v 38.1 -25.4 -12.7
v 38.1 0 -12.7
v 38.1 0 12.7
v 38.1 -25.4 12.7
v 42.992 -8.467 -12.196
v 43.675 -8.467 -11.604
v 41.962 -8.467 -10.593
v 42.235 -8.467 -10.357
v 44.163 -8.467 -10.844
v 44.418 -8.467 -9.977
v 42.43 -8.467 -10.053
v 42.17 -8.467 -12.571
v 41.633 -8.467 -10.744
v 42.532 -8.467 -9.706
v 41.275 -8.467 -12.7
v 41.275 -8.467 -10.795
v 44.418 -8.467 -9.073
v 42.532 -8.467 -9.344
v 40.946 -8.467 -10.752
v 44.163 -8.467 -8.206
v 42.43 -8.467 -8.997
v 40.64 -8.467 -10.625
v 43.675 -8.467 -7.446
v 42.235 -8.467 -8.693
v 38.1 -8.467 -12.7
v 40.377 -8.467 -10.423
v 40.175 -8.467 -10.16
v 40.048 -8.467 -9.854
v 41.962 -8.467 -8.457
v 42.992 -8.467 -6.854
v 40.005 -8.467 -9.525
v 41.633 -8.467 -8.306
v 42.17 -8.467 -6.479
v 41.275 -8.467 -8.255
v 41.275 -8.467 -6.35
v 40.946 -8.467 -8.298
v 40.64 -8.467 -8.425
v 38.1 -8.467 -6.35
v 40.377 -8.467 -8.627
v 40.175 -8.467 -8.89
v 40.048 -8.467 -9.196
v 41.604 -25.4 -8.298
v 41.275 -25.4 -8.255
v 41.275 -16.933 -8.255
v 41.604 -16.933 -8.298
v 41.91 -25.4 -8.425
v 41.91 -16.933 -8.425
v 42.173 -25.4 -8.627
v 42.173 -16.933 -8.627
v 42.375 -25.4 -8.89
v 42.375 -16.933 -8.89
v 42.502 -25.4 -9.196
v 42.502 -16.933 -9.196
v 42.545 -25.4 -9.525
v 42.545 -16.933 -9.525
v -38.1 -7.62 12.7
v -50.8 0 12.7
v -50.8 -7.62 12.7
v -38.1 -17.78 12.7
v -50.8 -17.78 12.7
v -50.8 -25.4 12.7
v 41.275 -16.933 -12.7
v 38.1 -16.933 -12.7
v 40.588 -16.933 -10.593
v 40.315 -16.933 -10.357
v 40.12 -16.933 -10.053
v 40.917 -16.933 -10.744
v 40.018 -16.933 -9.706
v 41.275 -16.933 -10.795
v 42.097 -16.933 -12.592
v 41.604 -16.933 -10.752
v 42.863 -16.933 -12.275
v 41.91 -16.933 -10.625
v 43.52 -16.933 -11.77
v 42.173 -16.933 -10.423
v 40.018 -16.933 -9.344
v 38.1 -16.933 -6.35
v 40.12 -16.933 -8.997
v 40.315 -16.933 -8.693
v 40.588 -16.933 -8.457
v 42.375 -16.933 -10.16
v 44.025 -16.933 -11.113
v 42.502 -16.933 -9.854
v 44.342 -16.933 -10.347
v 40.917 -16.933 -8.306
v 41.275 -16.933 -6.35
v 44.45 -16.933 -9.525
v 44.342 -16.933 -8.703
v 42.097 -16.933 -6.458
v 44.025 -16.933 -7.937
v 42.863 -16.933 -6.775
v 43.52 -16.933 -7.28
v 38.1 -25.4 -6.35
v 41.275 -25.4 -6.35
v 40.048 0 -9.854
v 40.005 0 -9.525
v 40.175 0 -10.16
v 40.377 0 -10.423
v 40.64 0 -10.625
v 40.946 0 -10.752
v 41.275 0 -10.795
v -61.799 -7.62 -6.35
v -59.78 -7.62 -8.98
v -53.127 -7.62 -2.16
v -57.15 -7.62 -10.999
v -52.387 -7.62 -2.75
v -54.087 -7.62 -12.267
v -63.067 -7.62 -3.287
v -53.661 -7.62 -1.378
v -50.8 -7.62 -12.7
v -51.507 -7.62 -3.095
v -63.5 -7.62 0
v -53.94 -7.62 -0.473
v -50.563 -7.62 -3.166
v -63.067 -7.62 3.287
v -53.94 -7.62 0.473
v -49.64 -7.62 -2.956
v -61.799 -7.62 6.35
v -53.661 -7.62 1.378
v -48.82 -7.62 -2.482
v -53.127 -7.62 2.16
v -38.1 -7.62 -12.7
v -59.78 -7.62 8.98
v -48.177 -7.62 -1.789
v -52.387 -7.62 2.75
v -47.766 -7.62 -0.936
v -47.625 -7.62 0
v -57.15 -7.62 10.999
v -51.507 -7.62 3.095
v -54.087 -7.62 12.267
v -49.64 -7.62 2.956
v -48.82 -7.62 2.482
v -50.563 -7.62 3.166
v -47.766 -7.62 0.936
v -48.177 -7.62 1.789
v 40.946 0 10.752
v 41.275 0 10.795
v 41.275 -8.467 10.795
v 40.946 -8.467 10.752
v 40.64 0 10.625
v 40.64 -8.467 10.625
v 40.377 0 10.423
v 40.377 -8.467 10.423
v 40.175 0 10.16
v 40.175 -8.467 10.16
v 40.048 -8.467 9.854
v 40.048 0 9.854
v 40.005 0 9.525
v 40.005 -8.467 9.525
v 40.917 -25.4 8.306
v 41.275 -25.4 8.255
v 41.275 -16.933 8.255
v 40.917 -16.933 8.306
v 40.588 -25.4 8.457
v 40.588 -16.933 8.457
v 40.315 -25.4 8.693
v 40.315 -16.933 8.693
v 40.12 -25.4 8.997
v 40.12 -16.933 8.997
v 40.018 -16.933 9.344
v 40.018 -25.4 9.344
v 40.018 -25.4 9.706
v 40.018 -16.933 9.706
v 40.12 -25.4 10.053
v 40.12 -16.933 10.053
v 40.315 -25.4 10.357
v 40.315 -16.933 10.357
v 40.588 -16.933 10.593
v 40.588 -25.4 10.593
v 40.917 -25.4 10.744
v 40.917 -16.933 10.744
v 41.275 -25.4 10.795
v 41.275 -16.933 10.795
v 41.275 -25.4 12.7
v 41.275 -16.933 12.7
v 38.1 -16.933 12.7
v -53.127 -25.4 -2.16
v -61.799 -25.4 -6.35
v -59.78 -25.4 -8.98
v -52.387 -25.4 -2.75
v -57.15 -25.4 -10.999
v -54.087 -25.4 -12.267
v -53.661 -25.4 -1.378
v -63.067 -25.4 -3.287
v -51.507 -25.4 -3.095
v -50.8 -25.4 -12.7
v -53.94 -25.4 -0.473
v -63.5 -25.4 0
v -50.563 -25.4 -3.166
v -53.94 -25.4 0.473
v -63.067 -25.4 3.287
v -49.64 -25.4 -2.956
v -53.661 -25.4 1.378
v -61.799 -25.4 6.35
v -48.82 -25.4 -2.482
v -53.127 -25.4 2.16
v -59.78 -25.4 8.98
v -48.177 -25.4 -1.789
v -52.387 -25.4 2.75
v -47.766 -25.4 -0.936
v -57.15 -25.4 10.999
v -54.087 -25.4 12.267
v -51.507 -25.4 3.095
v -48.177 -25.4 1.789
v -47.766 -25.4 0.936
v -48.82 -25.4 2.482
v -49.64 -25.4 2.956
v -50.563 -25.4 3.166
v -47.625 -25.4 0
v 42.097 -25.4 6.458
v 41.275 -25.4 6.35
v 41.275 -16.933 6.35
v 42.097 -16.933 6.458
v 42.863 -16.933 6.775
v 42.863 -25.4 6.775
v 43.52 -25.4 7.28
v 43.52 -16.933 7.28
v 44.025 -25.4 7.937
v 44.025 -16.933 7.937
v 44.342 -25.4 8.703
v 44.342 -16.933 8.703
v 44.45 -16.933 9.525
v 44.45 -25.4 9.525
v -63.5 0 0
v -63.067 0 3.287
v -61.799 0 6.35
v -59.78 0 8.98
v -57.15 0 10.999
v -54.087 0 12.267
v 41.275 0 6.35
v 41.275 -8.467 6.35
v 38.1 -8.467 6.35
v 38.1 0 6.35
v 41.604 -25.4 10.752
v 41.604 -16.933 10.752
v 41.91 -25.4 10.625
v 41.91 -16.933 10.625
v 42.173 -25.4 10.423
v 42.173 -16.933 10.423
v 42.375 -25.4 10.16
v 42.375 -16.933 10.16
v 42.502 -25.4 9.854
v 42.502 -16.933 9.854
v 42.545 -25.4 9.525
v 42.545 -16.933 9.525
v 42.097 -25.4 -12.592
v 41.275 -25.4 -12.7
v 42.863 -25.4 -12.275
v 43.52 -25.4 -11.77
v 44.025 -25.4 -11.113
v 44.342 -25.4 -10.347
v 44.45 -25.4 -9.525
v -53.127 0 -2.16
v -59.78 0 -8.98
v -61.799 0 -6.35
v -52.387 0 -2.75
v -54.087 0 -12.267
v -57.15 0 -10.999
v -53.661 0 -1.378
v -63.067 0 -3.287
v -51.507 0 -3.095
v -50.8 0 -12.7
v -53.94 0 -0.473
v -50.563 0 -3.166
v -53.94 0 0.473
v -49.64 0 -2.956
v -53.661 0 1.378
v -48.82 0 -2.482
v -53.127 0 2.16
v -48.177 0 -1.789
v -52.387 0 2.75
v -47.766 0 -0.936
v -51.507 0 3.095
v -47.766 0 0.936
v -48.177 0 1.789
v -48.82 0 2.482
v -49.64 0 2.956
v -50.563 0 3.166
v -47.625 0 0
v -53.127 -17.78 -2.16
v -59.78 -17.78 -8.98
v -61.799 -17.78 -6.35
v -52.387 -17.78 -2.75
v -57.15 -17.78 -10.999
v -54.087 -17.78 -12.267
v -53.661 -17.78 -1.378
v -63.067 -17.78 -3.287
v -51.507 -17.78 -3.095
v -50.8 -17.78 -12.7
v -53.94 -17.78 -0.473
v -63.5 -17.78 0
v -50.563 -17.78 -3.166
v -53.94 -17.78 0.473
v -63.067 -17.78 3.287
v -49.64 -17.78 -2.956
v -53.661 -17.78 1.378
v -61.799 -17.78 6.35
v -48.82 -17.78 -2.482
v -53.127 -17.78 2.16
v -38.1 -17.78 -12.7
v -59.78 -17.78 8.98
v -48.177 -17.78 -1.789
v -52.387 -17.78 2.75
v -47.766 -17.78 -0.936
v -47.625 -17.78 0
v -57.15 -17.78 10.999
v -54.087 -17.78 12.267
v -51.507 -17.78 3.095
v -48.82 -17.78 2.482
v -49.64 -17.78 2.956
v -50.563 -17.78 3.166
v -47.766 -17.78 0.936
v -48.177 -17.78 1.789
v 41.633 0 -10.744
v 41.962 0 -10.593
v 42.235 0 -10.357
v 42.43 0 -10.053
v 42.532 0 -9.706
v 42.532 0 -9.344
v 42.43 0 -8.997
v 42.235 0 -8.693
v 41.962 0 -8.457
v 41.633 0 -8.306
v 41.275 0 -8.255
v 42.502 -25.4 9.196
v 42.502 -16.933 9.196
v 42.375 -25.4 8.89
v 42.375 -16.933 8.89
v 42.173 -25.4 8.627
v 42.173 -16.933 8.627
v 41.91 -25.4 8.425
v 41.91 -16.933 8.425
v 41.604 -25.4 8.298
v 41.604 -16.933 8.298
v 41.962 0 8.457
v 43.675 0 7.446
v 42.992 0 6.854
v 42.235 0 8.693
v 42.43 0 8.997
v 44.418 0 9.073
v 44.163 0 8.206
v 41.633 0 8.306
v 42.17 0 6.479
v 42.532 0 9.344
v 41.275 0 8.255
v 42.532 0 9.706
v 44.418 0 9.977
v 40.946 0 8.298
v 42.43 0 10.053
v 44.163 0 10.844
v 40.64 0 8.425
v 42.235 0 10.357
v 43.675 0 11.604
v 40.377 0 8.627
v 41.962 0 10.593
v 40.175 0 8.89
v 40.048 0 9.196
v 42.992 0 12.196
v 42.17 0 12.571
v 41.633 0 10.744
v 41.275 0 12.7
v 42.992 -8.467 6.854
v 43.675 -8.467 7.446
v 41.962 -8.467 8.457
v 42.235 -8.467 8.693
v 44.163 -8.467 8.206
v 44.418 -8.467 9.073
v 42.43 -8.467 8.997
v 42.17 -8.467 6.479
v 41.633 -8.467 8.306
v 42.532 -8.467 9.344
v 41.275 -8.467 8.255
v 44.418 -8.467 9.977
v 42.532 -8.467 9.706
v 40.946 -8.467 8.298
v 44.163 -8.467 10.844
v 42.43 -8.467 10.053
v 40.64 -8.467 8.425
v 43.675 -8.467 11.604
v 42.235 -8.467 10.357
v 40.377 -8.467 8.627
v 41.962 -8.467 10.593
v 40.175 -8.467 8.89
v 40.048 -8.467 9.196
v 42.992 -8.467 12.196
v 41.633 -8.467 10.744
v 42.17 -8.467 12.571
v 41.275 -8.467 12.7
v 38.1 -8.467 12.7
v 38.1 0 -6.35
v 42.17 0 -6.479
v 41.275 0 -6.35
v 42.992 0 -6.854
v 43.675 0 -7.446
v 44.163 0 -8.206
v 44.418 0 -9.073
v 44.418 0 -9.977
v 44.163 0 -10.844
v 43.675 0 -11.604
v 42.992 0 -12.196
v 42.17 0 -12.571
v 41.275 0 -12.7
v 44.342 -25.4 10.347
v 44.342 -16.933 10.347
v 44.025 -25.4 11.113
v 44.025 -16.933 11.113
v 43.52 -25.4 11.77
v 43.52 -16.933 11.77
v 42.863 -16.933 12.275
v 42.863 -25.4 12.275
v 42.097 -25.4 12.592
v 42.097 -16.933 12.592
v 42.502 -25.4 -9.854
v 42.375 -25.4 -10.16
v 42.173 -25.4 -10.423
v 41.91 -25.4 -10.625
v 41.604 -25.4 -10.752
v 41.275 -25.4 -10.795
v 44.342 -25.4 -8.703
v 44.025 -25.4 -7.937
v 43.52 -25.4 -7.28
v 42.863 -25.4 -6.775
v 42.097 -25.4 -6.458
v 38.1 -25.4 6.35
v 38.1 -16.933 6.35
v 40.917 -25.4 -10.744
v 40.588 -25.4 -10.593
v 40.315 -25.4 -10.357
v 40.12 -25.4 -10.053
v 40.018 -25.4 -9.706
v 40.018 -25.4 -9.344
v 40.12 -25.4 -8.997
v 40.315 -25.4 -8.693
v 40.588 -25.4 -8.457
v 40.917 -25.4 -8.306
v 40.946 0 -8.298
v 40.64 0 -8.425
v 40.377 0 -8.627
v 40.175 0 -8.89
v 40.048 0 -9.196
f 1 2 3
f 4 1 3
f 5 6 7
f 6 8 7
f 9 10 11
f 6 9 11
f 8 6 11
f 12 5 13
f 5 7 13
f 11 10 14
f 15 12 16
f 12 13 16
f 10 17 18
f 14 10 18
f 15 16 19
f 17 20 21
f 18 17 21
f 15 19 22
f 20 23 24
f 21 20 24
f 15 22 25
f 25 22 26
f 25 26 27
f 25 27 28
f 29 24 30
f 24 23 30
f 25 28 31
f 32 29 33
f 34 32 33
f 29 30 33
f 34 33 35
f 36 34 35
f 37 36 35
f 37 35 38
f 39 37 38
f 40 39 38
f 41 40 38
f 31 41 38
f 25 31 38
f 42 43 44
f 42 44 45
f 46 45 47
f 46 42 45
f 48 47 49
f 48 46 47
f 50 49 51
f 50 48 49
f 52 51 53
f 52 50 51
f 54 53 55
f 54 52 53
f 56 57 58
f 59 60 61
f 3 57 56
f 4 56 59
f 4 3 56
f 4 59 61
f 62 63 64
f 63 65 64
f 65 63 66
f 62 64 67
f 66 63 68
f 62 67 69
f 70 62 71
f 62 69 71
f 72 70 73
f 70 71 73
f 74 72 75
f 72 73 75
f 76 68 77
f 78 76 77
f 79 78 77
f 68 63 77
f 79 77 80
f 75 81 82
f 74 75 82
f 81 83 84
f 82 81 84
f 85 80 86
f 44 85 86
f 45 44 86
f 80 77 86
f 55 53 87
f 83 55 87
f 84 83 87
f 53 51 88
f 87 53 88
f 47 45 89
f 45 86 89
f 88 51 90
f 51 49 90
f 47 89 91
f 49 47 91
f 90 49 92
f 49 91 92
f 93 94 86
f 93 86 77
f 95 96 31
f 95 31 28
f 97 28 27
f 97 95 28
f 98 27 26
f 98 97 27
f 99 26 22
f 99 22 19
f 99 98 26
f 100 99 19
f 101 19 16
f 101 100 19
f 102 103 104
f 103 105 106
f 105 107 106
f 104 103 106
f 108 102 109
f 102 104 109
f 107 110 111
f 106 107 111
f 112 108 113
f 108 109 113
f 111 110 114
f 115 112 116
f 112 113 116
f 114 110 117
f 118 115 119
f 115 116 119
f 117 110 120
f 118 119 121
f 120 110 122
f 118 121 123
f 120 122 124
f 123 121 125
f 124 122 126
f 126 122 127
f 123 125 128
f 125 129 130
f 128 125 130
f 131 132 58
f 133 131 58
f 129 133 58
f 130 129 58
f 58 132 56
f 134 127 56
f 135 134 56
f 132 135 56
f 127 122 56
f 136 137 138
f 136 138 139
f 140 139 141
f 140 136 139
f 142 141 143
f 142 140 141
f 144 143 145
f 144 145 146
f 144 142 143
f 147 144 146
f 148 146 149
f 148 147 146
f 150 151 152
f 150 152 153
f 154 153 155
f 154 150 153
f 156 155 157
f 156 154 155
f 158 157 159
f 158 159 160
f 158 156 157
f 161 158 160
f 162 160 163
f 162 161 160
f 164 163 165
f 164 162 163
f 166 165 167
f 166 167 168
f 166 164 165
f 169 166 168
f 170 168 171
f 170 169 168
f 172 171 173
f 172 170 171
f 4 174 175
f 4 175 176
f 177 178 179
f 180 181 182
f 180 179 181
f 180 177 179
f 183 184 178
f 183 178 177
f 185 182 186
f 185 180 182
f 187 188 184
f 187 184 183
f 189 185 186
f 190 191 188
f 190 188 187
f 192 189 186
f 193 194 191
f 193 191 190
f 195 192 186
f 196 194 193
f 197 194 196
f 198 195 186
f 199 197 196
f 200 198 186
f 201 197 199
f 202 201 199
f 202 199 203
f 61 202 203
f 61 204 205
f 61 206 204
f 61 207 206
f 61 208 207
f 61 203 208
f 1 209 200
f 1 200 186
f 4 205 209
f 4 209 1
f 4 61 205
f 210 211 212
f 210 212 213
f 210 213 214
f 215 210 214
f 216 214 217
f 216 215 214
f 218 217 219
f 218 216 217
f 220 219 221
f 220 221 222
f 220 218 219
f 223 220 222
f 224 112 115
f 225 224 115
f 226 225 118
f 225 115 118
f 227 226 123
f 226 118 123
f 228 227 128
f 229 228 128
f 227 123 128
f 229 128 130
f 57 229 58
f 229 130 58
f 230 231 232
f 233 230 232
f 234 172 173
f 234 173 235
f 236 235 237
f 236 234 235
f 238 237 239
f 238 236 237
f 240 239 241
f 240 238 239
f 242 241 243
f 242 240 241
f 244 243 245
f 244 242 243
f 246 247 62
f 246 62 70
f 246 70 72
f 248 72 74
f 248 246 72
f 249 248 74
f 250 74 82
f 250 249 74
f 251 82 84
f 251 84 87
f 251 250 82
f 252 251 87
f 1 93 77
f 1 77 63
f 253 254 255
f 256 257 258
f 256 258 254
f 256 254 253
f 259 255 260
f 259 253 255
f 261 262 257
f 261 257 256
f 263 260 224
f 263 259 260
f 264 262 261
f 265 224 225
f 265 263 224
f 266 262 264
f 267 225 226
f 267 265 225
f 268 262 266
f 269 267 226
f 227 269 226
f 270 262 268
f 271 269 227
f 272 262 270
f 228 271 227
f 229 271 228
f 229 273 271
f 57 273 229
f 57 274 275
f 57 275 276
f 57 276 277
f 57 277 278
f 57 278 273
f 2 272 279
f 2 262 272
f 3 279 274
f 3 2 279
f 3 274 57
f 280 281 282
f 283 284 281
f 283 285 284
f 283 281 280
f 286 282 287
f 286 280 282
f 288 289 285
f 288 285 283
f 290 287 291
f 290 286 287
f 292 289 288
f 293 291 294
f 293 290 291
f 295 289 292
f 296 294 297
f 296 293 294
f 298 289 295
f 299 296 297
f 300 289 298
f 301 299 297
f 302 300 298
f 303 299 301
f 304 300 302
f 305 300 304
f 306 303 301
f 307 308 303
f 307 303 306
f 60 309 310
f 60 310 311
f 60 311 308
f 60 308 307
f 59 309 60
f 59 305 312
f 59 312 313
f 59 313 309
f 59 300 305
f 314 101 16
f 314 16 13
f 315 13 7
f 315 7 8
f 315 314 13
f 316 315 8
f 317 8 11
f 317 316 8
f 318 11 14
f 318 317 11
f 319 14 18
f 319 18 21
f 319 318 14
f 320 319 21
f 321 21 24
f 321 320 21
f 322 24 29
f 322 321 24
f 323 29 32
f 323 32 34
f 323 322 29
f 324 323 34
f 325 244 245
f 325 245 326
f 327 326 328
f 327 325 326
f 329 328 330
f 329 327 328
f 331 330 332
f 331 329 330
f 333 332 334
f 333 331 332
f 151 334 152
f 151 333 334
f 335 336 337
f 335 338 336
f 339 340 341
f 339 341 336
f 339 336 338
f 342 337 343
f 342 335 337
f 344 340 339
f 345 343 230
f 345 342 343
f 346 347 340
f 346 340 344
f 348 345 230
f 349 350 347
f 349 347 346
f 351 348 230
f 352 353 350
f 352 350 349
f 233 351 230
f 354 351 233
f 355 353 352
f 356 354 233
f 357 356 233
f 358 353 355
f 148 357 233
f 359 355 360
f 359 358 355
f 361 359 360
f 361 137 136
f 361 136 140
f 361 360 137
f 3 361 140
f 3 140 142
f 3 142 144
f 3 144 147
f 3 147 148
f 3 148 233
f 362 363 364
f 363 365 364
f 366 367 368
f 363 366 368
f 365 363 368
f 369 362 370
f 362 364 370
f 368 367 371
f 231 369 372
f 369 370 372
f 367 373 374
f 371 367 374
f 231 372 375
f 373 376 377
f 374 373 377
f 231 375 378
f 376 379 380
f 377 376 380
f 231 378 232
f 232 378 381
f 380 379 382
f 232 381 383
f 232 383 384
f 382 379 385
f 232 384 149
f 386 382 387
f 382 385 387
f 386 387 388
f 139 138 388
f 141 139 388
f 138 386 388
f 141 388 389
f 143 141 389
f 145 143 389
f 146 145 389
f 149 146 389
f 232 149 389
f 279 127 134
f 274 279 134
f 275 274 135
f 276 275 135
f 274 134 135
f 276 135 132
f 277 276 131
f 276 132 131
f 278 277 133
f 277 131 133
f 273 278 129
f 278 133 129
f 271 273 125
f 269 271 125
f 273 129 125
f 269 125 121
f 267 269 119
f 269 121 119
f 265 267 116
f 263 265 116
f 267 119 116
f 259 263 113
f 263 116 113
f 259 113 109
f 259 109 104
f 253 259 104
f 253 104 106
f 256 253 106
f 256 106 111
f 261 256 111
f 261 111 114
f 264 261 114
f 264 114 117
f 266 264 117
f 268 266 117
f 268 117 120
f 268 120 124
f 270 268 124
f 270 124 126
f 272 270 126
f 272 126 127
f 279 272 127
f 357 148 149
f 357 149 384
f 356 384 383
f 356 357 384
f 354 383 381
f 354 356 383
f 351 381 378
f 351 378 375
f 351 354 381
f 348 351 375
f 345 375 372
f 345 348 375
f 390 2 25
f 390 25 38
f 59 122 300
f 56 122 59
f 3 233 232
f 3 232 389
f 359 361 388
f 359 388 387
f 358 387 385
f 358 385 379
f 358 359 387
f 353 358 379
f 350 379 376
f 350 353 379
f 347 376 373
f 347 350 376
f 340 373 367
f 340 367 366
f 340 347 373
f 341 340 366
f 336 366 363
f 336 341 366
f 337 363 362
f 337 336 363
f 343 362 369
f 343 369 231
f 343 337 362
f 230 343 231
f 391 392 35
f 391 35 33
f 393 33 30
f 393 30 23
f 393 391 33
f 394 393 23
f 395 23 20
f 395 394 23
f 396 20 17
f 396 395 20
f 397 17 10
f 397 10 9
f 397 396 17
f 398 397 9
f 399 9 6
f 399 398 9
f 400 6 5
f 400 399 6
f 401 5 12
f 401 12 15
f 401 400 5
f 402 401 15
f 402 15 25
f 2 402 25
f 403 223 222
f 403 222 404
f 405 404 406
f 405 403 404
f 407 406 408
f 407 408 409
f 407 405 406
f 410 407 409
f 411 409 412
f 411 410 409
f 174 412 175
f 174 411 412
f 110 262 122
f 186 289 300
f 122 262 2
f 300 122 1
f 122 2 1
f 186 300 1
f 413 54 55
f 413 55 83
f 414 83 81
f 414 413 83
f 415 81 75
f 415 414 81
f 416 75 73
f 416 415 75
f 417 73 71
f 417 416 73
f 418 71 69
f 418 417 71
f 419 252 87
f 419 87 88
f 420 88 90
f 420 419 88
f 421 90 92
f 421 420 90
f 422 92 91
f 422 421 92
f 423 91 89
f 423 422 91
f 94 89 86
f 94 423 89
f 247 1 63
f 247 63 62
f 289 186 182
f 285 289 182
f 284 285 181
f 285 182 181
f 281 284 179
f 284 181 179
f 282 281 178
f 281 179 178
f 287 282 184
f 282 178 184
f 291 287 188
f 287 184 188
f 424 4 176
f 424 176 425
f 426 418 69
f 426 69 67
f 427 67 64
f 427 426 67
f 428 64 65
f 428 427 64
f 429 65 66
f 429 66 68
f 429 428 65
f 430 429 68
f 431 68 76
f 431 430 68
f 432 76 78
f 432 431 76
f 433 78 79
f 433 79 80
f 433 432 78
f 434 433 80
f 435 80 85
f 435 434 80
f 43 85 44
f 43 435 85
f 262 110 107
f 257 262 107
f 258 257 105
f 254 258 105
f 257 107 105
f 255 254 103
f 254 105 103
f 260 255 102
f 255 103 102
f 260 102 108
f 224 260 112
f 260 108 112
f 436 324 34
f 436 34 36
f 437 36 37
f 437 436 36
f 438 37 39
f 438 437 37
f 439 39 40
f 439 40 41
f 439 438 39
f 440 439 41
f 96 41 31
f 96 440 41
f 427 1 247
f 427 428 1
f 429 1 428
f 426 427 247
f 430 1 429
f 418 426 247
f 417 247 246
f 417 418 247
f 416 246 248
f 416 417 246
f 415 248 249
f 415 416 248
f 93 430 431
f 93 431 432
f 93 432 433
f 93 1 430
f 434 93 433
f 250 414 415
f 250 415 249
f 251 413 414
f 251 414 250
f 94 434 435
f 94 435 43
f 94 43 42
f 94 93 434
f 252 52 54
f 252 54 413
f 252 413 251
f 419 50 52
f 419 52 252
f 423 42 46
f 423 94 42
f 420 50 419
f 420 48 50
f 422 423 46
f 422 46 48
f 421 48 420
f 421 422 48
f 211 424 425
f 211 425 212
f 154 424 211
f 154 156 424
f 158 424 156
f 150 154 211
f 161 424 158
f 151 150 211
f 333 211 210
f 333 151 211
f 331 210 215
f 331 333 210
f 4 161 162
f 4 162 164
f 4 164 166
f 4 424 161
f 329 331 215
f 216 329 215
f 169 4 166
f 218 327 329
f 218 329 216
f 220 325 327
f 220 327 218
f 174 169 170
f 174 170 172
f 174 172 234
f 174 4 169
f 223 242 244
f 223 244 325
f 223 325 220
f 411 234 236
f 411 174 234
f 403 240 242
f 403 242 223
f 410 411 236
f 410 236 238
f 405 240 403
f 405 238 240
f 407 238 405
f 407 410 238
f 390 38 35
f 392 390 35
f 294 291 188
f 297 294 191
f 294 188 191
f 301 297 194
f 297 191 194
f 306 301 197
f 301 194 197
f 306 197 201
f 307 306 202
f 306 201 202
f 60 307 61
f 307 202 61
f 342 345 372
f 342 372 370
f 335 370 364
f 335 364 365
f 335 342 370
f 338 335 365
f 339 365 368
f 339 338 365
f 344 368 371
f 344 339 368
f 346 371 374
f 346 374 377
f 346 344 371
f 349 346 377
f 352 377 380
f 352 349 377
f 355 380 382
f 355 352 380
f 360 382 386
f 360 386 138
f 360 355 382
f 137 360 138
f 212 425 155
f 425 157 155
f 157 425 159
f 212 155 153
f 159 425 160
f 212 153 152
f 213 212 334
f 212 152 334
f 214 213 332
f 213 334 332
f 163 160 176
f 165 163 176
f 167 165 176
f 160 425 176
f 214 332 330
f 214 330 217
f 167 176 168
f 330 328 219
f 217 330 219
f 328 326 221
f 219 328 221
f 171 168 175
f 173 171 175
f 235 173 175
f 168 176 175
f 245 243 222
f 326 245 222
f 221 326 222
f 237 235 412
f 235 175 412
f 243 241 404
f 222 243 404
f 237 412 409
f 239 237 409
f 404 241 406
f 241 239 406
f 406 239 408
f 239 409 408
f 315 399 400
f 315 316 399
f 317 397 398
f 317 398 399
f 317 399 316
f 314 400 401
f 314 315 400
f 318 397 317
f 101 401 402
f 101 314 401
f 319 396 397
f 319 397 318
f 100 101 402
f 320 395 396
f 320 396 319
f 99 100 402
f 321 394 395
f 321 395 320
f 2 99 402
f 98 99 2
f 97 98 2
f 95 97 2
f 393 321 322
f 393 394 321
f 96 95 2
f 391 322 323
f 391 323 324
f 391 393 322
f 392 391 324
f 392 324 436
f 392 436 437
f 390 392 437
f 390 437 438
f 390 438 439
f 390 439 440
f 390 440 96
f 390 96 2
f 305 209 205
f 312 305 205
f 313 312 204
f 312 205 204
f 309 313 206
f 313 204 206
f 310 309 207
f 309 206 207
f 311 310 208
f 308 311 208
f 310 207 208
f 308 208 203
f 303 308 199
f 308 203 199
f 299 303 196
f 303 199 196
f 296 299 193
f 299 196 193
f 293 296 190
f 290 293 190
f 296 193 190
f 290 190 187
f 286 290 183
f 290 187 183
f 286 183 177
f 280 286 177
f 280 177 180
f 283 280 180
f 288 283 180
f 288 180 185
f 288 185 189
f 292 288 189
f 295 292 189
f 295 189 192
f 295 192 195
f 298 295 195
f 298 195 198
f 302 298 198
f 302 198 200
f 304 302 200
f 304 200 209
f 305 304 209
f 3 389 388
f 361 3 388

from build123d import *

# Parameters (mm, degrees)
F0_W     = 76.2
F0_H     = 25.4
F1_DEPTH = 25.4
F2_W     = 7.62
F2_H     = 25.4
F3_DEPTH = 25.4
F4_R     = 3.175
F5_DEPTH = 25.4
F7_DEPTH = 8.4666666667
F9_DEPTH = 8.4666666667


with BuildPart() as f1:
    # F0 (on Front) → F1 (new body)
    with BuildSketch(Plane.XZ):
        Rectangle(F0_W, F0_H)
    extrude(amount=F1_DEPTH)

    # F2 (on face) → F3 (join)
    with BuildSketch(Plane(origin=(-38.1, 0, 0), x_dir=(0, -1, 0), z_dir=(-1, 0, 0))):
        with Locations((3.81, 0)):
            Rectangle(F2_W, F2_H)
        with Locations((21.59, 0)):
            Rectangle(F2_W, F2_H)
    extrude(amount=F3_DEPTH)

    # F4 (on face) → F5 (cut)
    with BuildSketch(Plane.XZ.offset(25.4)):
        with BuildLine():
            Line((-50.8, 12.7), (-63.5, 12.7))
            Line((-63.5, 12.7), (-63.5, 0))
            ThreePointArc((-63.5, 0), (-59.7802561211, 8.9802561211), (-50.8, 12.7))
        make_face()
        with BuildLine():
            ThreePointArc((-50.8, -12.7), (-59.7802561211, -8.9802561211), (-63.5, 0))
            Line((-63.5, 0), (-63.5, -12.7))
            Line((-63.5, -12.7), (-50.8, -12.7))
        make_face()
        with Locations((-50.8, 0)):
            Circle(F4_R)
    extrude(amount=-F5_DEPTH, mode=Mode.SUBTRACT)


with BuildPart() as f7:
    # F6 (on face) → F7 (new body)
    with BuildSketch(Plane.XZ.offset(25.4)):
        with BuildLine():
            Line((38.1, -9.525), (38.1, -12.7))
            Line((38.1, -12.7), (41.275, -12.7))
            ThreePointArc((41.275, -12.7), (39.0299359697, -11.7700640303), (38.1, -9.525))
        make_face()
        with BuildLine():
            ThreePointArc((38.1, -9.525), (39.0299359697, -11.7700640303), (41.275, -12.7))
            Line((41.275, -12.7), (41.275, -10.795))
            ThreePointArc((41.275, -10.795), (40.005, -9.525), (41.275, -8.255))
            Line((41.275, -8.255), (41.275, -6.35))
            ThreePointArc((41.275, -6.35), (39.0299359697, -7.2799359697), (38.1, -9.525))
        make_face()
        with BuildLine():
            Line((41.275, -10.795), (41.275, -12.7))
            ThreePointArc((41.275, -12.7), (43.5200640303, -11.7700640303), (44.45, -9.525))
            ThreePointArc((44.45, -9.525), (43.5200640303, -7.2799359697), (41.275, -6.35))
            Line((41.275, -6.35), (41.275, -8.255))
            ThreePointArc((41.275, -8.255), (42.1730256121, -8.6269743879), (42.545, -9.525))
            ThreePointArc((42.545, -9.525), (42.1730256121, -10.4230256121), (41.275, -10.795))
        make_face()
        with BuildLine():
            Line((38.1, -6.35), (38.1, -9.525))
            ThreePointArc((38.1, -9.525), (39.0299359697, -7.2799359697), (41.275, -6.35))
            Line((41.275, -6.35), (38.1, -6.35))
        make_face()
    extrude(amount=-F7_DEPTH)


with BuildPart() as f7b:
    # F6 (on face) → F7, piece 2 (new body)
    with BuildSketch(Plane.XZ.offset(25.4)):
        with BuildLine():
            Line((41.275, 12.7), (38.1, 12.7))
            Line((38.1, 12.7), (38.1, 9.525))
            ThreePointArc((38.1, 9.525), (39.0299359697, 11.7700640303), (41.275, 12.7))
        make_face()
        with BuildLine():
            ThreePointArc((44.45, 9.525), (43.5200640303, 11.7700640303), (41.275, 12.7))
            Line((41.275, 12.7), (41.275, 10.795))
            ThreePointArc((41.275, 10.795), (42.1730256121, 10.4230256121), (42.545, 9.525))
            ThreePointArc((42.545, 9.525), (42.1730256121, 8.6269743879), (41.275, 8.255))
            Line((41.275, 8.255), (41.275, 6.35))
            ThreePointArc((41.275, 6.35), (43.5200640303, 7.2799359697), (44.45, 9.525))
        make_face()
        with BuildLine():
            Line((41.275, 10.795), (41.275, 12.7))
            ThreePointArc((41.275, 12.7), (39.0299359697, 11.7700640303), (38.1, 9.525))
            ThreePointArc((38.1, 9.525), (39.0299359697, 7.2799359697), (41.275, 6.35))
            Line((41.275, 6.35), (41.275, 8.255))
            ThreePointArc((41.275, 8.255), (40.005, 9.525), (41.275, 10.795))
        make_face()
        with BuildLine():
            ThreePointArc((41.275, 6.35), (39.0299359697, 7.2799359697), (38.1, 9.525))
            Line((38.1, 9.525), (38.1, 6.35))
            Line((38.1, 6.35), (41.275, 6.35))
        make_face()
    extrude(amount=-F7_DEPTH)


with BuildPart() as f9:
    # F8 (on face) → F9 (new body)
    with BuildSketch(Plane(origin=(0, 0, 0), x_dir=(-1, 0, 0), z_dir=(0, 1, 0))):
        with BuildLine():
            Line((-41.275, -12.7), (-38.1, -12.7))
            Line((-38.1, -12.7), (-38.1, -9.525))
            ThreePointArc((-38.1, -9.525), (-39.0299359697, -11.7700640303), (-41.275, -12.7))
        make_face()
        with BuildLine():
            ThreePointArc((-41.275, -6.35), (-44.45, -9.525), (-41.275, -12.7))
            Line((-41.275, -12.7), (-41.275, -10.795))
            ThreePointArc((-41.275, -10.795), (-42.545, -9.525), (-41.275, -8.255))
            Line((-41.275, -8.255), (-41.275, -6.35))
        make_face()
        with BuildLine():
            Line((-41.275, -10.795), (-41.275, -12.7))
            ThreePointArc((-41.275, -12.7), (-39.0299359697, -11.7700640303), (-38.1, -9.525))
            ThreePointArc((-38.1, -9.525), (-39.0299359697, -7.2799359697), (-41.275, -6.35))
            Line((-41.275, -6.35), (-41.275, -8.255))
            ThreePointArc((-41.275, -8.255), (-40.3769743879, -8.6269743879), (-40.005, -9.525))
            ThreePointArc((-40.005, -9.525), (-40.3769743879, -10.4230256121), (-41.275, -10.795))
        make_face()
        with BuildLine():
            ThreePointArc((-41.275, -6.35), (-39.0299359697, -7.2799359697), (-38.1, -9.525))
            Line((-38.1, -9.525), (-38.1, -6.35))
            Line((-38.1, -6.35), (-41.275, -6.35))
        make_face()
    extrude(amount=-F9_DEPTH)


with BuildPart() as f9b:
    # F8 (on face) → F9, piece 2 (new body)
    with BuildSketch(Plane(origin=(0, 0, 0), x_dir=(-1, 0, 0), z_dir=(0, 1, 0))):
        with BuildLine():
            Line((-38.1, 9.525), (-38.1, 12.7))
            Line((-38.1, 12.7), (-41.275, 12.7))
            ThreePointArc((-41.275, 12.7), (-39.0299359697, 11.7700640303), (-38.1, 9.525))
        make_face()
        with BuildLine():
            ThreePointArc((-38.1, 9.525), (-39.0299359697, 11.7700640303), (-41.275, 12.7))
            Line((-41.275, 12.7), (-41.275, 10.795))
            ThreePointArc((-41.275, 10.795), (-40.3769743879, 10.4230256121), (-40.005, 9.525))
            ThreePointArc((-40.005, 9.525), (-40.3769743879, 8.6269743879), (-41.275, 8.255))
            Line((-41.275, 8.255), (-41.275, 6.35))
            ThreePointArc((-41.275, 6.35), (-39.0299359697, 7.2799359697), (-38.1, 9.525))
        make_face()
        with BuildLine():
            Line((-41.275, 10.795), (-41.275, 12.7))
            ThreePointArc((-41.275, 12.7), (-44.45, 9.525), (-41.275, 6.35))
            Line((-41.275, 6.35), (-41.275, 8.255))
            ThreePointArc((-41.275, 8.255), (-42.545, 9.525), (-41.275, 10.795))
        make_face()
        with BuildLine():
            Line((-38.1, 6.35), (-38.1, 9.525))
            ThreePointArc((-38.1, 9.525), (-39.0299359697, 7.2799359697), (-41.275, 6.35))
            Line((-41.275, 6.35), (-38.1, 6.35))
        make_face()
    extrude(amount=-F9_DEPTH)


solid = Compound([f1.part, f7.part, f7b.part, f9.part, f9b.part])
